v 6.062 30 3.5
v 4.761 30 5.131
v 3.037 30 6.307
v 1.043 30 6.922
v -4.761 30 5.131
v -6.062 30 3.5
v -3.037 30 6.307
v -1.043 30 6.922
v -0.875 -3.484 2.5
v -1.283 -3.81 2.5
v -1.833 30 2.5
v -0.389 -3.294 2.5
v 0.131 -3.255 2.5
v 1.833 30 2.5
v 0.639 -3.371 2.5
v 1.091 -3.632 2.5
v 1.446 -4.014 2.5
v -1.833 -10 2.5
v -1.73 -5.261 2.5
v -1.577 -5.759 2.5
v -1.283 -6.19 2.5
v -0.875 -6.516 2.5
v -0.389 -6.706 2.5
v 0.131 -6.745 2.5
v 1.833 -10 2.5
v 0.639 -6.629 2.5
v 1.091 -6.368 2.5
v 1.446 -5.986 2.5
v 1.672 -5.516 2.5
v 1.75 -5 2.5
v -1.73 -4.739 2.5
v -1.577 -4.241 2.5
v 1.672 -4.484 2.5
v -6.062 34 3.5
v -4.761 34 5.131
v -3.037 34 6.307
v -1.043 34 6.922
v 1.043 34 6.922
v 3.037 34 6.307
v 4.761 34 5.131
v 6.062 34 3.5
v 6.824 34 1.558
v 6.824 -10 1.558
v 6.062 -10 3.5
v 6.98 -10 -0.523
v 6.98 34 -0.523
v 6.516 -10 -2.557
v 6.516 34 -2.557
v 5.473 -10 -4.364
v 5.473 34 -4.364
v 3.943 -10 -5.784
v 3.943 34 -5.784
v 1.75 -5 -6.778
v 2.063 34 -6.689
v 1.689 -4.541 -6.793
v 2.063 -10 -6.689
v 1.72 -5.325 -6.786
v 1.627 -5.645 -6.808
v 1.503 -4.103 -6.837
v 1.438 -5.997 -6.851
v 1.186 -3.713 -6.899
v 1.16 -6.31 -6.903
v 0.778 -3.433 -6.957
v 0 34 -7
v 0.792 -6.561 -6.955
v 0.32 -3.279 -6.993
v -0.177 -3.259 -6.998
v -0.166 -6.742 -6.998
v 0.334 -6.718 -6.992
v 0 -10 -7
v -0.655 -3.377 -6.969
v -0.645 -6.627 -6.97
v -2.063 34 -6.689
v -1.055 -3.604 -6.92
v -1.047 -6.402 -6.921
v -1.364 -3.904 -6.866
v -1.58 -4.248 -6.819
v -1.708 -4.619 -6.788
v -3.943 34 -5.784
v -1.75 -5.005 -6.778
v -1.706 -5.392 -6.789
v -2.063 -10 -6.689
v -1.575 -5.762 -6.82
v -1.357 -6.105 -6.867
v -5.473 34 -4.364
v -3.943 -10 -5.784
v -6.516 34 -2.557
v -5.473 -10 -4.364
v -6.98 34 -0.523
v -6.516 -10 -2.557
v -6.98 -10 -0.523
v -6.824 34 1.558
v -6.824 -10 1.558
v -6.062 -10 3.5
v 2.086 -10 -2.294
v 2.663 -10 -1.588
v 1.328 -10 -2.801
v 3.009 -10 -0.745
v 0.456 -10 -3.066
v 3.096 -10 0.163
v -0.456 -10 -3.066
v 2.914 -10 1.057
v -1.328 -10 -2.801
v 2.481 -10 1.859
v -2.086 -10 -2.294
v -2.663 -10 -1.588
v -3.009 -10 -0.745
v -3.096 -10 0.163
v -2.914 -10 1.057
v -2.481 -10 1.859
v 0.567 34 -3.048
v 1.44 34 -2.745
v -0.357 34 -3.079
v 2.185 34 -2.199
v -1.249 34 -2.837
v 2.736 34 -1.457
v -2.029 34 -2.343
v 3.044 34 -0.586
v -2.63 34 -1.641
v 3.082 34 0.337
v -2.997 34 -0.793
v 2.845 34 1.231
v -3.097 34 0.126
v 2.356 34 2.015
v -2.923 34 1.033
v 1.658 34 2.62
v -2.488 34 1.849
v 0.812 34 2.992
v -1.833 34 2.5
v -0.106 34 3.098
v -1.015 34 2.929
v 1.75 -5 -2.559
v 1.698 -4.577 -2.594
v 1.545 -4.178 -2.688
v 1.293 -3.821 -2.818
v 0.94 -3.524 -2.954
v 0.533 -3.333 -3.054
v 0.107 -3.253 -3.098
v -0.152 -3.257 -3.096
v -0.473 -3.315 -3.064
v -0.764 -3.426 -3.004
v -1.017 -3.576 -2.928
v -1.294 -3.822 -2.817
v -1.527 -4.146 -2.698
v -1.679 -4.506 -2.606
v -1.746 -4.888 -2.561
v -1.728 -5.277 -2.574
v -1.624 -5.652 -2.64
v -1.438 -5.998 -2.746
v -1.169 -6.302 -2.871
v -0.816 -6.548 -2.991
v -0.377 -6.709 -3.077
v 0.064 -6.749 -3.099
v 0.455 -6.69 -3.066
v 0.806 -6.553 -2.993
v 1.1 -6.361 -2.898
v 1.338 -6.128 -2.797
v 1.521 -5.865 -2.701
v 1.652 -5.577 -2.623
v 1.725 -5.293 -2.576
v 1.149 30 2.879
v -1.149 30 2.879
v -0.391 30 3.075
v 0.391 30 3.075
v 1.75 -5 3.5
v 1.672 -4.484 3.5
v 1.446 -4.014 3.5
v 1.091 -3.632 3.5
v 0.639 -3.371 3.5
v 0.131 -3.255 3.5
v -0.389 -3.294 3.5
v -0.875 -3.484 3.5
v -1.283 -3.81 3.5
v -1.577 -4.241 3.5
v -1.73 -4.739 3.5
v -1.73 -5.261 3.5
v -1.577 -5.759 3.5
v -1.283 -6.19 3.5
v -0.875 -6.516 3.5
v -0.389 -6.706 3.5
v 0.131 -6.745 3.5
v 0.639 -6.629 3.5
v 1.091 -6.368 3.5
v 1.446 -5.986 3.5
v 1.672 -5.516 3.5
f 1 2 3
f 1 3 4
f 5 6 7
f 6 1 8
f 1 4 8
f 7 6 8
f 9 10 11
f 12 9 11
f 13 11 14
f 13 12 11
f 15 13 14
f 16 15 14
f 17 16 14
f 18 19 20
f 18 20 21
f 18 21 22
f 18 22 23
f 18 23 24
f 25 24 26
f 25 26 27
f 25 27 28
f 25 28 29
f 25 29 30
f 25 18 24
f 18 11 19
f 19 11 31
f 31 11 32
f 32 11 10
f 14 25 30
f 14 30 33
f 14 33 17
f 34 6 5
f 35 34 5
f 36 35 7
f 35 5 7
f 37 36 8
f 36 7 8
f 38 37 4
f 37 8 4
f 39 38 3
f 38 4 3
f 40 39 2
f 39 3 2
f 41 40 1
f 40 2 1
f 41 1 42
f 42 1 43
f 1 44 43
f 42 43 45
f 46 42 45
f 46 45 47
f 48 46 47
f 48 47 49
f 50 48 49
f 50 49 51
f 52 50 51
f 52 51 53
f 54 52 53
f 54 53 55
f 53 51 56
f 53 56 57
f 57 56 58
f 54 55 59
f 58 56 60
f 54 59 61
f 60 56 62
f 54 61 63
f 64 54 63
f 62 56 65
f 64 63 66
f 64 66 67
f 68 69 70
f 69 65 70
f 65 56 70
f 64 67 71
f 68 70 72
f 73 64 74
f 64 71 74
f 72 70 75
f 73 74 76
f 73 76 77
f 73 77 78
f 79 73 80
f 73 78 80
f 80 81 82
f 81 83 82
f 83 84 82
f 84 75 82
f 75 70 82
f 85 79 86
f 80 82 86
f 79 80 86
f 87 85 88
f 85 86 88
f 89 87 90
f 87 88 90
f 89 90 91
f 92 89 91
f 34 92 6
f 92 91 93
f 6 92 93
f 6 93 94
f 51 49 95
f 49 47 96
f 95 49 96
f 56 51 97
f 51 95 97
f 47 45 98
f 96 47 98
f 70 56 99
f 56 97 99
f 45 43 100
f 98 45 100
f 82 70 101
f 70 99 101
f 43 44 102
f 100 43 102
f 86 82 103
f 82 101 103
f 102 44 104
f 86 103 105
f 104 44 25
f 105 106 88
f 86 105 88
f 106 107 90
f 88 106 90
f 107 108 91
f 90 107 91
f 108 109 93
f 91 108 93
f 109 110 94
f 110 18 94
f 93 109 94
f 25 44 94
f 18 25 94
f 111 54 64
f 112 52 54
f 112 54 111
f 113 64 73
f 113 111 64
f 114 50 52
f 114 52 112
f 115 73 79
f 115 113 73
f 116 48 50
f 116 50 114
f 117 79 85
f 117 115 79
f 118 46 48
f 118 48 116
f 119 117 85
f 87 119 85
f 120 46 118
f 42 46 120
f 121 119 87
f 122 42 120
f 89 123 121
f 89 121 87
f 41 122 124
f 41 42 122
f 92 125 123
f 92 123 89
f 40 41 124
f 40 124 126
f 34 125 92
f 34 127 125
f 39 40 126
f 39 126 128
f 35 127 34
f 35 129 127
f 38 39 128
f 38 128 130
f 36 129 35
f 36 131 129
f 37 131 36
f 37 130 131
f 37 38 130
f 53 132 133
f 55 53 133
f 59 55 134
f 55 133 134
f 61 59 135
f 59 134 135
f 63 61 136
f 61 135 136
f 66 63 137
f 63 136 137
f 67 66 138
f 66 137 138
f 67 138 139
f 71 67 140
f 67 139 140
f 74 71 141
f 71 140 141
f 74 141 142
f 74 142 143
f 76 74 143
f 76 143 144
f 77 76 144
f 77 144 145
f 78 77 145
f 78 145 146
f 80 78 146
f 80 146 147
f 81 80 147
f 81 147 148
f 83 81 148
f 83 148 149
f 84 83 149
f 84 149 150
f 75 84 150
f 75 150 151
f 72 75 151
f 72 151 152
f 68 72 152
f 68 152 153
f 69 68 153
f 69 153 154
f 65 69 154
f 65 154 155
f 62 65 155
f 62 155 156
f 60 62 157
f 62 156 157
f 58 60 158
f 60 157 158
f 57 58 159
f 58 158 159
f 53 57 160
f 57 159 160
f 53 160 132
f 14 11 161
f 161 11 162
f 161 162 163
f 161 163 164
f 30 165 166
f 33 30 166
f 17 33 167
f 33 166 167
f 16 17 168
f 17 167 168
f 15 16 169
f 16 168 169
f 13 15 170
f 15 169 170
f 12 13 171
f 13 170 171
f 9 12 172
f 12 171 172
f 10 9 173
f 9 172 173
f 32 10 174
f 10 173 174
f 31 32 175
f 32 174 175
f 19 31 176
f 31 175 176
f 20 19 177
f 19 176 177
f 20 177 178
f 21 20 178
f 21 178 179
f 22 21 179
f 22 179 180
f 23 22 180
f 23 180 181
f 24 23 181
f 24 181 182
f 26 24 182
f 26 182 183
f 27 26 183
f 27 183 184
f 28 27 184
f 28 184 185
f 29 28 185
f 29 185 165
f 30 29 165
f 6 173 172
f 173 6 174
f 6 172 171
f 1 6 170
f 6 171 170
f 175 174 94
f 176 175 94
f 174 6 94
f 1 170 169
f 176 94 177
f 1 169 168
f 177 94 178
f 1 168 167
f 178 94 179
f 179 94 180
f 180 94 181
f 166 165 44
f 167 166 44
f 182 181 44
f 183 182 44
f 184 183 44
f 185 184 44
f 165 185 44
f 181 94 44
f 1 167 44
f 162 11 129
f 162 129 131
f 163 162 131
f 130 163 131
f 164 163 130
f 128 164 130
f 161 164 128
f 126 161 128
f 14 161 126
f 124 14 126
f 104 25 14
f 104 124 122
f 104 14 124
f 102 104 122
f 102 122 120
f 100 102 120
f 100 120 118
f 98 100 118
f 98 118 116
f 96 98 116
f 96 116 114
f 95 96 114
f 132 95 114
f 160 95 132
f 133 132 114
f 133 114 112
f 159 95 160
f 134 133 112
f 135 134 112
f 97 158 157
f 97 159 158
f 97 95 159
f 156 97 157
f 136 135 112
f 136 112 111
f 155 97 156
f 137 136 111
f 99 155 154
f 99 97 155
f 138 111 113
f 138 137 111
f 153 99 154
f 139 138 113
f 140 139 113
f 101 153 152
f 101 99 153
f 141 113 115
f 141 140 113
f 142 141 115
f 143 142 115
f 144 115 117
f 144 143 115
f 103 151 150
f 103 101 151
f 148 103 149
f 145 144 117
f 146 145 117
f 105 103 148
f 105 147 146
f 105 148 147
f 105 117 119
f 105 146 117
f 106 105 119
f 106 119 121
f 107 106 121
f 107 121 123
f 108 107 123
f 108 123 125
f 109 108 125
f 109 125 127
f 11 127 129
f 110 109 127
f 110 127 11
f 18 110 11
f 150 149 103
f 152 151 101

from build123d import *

# Parameters (mm, degrees)
Y_KSEKLIK_EKSTR_ZYON1_DEPTH = 30
IZIM2_R                     = 7
IZIM2_R_2                   = 3.1
Y_KSEKLIK_EKSTR_ZYON2_DEPTH = 4
Y_KSEKLIK_EKSTR_ZYON3_START = 10
Y_KSEKLIK_EKSTR_ZYON3_DEPTH = 10
KES_EKSTR_ZYON2_START       = -10
KES_EKSTR_ZYON2_DEPTH       = 10
IZIM7_R                     = 1.75
KES_EKSTR_ZYON3_DEPTH       = 12


with BuildPart() as part:
    # Çizim1 → Yükseklik-Ekstrüzyon1 (new body)
    with BuildSketch(Plane(origin=(0, 0, 0), x_dir=(1, 0, 0), z_dir=(0, 1, 0))):
        with BuildLine():
            Line((-6.062177826, -3.5), (6.062177826, -3.5))
            ThreePointArc((6.062177826, -3.5), (0, 7), (-6.062177826, -3.5))
        make_face()
        with BuildLine():
            Line((-1.833030278, -2.5), (1.833030278, -2.5))
            ThreePointArc((1.833030278, -2.5), (0, 3.1), (-1.833030278, -2.5))
        make_face(mode=Mode.SUBTRACT)
    extrude(amount=Y_KSEKLIK_EKSTR_ZYON1_DEPTH)

    # Çizim2 → Yükseklik-Ekstrüzyon2 (add)
    with BuildSketch(Plane(origin=(0, 30, 0), x_dir=(1, 0, 0), z_dir=(0, 1, 0))):
        with Locations(Location((0, 0, 0), (0, 0, 210))):
            Circle(IZIM2_R)
        with Locations(Location((0, 0, 0), (0, 0, 233.750679117))):
            Circle(IZIM2_R_2, mode=Mode.SUBTRACT)
    extrude(amount=Y_KSEKLIK_EKSTR_ZYON2_DEPTH)

    # Çizim3 → Yükseklik-Ekstrüzyon3 (add)
    with BuildSketch(Plane.XZ.offset(Y_KSEKLIK_EKSTR_ZYON3_START)):
        with BuildLine():
            Line((-6.062177826, 3.5), (6.062177826, 3.5))
            ThreePointArc((6.062177826, 3.5), (0, -7), (-6.062177826, 3.5))
        make_face()
    extrude(amount=-Y_KSEKLIK_EKSTR_ZYON3_DEPTH)

    # Çizim5 → Kes-Ekstrüzyon2 (cut)
    with BuildSketch(Plane(origin=(0, 0, 0), x_dir=(1, 0, 0), z_dir=(0, 1, 0)).offset(KES_EKSTR_ZYON2_START)):
        with BuildLine():
            Line((-1.833030278, -2.5), (1.833030278, -2.5))
            ThreePointArc((1.833030278, -2.5), (0, 3.1), (-1.833030278, -2.5))
        make_face()
    extrude(amount=KES_EKSTR_ZYON2_DEPTH, mode=Mode.SUBTRACT)

    # Çizim7 → Kes-Ekstrüzyon3 (cut)
    with BuildSketch(Plane.XY.offset(3.5)):
        with Locations((0, -5)):
            Circle(IZIM7_R)
    extrude(amount=-KES_EKSTR_ZYON3_DEPTH, mode=Mode.SUBTRACT)


solid = part.part
